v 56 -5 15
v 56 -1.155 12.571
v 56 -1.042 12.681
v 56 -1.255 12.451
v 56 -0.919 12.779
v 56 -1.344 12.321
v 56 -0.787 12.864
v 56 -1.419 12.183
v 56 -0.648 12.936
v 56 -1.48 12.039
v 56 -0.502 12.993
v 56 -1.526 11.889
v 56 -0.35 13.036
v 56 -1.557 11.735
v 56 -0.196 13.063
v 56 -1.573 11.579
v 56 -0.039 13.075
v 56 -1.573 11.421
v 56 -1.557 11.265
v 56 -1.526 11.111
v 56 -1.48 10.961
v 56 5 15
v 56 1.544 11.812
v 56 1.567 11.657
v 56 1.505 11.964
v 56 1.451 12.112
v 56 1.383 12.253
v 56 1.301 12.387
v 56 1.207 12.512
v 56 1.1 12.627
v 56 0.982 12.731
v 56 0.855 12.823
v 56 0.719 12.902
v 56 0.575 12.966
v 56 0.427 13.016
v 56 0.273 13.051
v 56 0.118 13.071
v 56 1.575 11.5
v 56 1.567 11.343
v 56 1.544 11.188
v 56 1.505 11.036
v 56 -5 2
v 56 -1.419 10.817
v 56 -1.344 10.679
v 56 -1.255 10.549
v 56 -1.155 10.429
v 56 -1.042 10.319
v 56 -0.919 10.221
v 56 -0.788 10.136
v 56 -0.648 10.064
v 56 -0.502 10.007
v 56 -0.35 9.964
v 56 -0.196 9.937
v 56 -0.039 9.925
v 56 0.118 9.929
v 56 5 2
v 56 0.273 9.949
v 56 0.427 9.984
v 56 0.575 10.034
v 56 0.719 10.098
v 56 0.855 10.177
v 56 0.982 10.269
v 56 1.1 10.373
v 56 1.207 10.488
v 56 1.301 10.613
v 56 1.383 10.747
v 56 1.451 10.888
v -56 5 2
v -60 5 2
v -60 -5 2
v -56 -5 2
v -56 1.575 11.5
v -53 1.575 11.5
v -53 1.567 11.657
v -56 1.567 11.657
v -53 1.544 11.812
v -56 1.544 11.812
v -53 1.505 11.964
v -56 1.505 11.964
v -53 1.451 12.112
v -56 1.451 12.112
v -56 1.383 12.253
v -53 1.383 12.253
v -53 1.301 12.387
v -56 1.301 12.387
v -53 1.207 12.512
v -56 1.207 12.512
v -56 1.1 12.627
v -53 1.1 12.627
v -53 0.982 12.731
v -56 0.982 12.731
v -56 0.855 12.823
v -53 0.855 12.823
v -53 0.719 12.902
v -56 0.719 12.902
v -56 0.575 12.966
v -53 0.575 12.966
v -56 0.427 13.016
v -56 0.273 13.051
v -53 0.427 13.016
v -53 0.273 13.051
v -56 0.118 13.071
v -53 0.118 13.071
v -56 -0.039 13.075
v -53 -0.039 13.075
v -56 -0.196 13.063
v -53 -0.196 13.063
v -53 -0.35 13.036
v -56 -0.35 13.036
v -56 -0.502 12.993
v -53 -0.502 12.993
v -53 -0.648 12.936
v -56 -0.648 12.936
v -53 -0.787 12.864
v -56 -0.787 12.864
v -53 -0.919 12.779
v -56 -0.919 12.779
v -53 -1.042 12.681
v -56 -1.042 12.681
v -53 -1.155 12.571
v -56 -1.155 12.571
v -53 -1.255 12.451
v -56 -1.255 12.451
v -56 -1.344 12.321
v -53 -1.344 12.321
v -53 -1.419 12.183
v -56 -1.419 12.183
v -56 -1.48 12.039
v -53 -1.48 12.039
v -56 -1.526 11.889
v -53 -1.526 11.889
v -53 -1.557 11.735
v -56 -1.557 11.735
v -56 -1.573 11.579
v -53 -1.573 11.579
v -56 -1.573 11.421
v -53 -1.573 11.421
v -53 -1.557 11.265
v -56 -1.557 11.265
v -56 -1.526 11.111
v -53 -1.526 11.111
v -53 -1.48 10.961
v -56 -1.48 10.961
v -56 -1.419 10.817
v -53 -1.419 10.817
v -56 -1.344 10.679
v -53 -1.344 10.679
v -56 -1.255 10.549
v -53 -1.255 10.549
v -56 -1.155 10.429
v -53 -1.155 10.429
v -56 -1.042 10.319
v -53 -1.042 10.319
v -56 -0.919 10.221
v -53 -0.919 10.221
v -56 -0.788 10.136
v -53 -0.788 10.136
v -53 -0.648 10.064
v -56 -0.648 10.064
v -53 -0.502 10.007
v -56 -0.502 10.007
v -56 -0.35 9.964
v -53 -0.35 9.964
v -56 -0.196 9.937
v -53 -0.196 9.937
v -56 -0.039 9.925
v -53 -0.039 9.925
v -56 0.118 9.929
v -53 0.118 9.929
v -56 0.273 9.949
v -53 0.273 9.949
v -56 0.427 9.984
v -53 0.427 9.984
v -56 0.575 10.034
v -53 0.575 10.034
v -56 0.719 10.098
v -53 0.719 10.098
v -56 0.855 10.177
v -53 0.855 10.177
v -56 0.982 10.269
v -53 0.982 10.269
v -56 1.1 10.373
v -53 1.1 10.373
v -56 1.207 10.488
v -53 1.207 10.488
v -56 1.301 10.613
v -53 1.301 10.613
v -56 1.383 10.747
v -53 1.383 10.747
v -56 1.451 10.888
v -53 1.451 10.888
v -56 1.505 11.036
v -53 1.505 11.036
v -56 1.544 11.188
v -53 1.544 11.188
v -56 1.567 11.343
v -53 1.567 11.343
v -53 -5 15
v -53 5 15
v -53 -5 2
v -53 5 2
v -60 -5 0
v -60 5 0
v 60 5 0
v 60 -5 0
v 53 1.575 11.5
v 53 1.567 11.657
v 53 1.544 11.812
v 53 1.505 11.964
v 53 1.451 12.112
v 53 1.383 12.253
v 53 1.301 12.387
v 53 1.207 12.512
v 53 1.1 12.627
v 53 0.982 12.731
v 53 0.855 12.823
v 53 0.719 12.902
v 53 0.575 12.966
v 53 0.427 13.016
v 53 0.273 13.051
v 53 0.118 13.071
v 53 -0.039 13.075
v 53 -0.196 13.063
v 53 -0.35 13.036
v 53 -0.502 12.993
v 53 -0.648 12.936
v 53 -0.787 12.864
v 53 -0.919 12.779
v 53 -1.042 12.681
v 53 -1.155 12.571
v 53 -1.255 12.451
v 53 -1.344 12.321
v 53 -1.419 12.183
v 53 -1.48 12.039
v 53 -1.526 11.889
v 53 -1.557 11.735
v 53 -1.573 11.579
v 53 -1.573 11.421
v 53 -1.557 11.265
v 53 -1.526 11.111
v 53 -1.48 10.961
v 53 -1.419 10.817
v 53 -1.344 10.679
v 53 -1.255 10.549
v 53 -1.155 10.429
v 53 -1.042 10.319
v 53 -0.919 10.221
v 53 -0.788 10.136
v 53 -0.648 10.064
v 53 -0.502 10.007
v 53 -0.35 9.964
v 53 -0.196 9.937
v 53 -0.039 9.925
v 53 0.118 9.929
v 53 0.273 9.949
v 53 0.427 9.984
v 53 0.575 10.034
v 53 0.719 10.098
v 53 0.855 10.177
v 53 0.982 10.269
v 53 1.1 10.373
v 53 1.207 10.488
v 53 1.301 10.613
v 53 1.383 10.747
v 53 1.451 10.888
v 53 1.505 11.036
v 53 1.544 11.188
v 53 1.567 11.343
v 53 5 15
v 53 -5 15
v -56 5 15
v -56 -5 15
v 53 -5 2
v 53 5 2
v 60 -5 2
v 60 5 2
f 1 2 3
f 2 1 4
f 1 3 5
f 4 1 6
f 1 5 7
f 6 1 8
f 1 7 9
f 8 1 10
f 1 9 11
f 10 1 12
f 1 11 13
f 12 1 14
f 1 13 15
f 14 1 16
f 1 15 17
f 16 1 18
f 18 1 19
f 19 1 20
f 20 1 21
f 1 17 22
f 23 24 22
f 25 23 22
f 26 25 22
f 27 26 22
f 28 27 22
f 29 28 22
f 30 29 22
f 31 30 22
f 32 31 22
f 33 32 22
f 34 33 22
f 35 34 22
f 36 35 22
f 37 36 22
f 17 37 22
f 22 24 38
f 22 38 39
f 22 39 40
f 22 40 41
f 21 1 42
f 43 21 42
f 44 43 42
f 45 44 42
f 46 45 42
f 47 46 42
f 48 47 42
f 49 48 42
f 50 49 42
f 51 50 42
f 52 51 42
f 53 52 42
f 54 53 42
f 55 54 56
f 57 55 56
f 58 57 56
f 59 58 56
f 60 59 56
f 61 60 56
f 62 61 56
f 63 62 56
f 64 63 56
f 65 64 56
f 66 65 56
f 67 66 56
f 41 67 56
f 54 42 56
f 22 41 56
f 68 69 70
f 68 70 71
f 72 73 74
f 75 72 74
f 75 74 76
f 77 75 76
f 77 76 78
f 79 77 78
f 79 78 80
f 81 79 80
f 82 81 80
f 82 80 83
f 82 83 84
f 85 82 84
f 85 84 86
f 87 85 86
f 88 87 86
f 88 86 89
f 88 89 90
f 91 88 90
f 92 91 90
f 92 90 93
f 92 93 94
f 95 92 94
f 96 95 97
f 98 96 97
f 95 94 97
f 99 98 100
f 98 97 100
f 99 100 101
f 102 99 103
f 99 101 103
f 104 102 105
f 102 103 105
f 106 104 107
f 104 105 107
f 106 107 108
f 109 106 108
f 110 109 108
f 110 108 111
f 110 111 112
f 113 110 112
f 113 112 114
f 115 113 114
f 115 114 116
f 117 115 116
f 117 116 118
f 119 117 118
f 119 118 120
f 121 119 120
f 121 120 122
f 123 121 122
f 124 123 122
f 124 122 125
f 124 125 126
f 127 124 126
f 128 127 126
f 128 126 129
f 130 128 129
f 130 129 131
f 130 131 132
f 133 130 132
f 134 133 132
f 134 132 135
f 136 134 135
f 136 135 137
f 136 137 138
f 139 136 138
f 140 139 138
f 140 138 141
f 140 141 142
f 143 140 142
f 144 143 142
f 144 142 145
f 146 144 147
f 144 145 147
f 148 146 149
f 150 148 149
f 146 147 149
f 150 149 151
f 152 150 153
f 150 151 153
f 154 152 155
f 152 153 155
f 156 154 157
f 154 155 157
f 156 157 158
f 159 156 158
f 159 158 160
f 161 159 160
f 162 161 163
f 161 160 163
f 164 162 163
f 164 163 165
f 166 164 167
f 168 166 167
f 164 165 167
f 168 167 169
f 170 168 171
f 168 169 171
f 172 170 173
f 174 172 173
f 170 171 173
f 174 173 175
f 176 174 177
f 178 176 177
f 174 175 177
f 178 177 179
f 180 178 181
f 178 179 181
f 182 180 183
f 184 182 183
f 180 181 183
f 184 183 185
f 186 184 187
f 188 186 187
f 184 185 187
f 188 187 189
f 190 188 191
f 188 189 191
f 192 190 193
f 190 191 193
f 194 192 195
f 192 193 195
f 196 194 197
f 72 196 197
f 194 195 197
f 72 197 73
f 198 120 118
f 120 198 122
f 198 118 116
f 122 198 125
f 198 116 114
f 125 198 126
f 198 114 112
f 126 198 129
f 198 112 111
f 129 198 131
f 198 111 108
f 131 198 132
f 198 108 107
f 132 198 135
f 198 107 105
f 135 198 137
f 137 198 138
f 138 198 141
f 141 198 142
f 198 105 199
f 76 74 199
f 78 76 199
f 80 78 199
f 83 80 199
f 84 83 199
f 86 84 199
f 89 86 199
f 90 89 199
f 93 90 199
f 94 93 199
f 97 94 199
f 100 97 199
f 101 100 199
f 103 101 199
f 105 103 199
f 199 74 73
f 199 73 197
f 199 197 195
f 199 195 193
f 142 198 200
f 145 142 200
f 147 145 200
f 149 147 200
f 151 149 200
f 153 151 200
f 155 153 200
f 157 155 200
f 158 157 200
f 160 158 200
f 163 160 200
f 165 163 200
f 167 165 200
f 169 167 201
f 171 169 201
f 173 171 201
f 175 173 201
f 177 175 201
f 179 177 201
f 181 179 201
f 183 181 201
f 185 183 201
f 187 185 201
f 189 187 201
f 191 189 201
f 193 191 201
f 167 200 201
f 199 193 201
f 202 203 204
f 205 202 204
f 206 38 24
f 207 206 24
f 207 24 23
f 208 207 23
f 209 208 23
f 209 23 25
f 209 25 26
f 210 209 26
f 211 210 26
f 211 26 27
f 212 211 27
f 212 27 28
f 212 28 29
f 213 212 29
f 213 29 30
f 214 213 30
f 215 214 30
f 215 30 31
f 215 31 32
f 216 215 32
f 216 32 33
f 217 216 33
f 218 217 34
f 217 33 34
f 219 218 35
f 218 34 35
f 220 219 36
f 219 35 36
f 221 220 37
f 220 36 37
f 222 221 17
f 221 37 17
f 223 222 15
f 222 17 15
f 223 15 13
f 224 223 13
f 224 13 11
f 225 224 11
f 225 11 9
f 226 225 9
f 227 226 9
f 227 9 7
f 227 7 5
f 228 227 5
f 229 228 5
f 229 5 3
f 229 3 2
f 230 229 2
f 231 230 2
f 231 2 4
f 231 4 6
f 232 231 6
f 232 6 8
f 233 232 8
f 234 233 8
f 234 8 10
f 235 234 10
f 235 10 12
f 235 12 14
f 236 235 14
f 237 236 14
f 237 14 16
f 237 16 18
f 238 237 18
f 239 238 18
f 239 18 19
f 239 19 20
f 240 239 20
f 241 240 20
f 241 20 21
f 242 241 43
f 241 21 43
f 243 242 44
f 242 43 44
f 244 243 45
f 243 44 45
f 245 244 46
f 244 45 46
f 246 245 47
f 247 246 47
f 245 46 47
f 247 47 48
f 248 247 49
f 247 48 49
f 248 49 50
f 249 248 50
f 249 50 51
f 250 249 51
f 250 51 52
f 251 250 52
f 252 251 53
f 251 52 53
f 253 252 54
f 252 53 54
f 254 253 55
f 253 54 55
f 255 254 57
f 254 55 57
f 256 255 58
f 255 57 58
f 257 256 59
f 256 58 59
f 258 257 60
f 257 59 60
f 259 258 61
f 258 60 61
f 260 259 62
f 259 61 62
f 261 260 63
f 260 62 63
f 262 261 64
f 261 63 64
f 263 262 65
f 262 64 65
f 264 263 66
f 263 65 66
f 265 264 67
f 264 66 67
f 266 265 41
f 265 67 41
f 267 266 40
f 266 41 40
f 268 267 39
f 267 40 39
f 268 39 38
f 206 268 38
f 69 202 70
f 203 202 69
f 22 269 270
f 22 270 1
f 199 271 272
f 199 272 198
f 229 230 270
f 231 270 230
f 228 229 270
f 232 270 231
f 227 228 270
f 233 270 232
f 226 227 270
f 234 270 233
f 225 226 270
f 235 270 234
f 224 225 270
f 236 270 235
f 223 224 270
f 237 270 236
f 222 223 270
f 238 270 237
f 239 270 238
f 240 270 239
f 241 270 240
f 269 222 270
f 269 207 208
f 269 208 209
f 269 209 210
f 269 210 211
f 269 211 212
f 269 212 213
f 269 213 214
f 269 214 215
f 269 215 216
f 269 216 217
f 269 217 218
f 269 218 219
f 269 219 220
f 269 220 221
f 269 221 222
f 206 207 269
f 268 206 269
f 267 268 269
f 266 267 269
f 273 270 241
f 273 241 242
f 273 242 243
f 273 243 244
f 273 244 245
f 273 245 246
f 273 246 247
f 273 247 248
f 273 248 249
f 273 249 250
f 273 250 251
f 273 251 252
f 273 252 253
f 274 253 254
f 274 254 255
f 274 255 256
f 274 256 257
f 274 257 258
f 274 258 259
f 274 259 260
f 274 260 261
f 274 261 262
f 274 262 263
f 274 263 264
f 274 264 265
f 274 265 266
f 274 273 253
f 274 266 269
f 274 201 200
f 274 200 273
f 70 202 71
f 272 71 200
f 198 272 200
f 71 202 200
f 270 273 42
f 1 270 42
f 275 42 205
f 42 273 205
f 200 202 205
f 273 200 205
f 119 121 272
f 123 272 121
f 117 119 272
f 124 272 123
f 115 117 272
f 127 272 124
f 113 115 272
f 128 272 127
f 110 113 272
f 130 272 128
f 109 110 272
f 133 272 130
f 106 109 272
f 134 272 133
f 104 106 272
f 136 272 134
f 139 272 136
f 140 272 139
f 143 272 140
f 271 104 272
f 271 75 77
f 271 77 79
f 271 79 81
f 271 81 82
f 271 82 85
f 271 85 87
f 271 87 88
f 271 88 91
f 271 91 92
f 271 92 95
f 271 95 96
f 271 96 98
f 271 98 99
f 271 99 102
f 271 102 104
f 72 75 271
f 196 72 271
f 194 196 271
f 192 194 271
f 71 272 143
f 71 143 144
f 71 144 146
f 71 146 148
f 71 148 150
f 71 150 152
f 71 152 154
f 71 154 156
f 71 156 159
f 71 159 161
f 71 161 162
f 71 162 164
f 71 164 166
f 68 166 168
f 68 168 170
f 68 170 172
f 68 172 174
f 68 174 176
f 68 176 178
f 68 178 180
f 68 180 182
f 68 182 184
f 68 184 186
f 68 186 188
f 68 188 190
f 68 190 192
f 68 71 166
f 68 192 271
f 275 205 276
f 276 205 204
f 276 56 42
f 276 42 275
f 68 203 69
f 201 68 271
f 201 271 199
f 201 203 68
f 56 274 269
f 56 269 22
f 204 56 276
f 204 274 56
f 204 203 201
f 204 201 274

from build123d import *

# Parameters (mm, degrees)
SKETCH_1_W          = 120
SKETCH_1_H          = 10
EXTRUDE_1_DEPTH     = 2
SKETCH_2_W          = 3
SKETCH_2_H          = 10
EXTRUDE_2_DEPTH     = 13
CUT_EXTRUDE_1_REACH = 119.073
SKETCH_3_R          = 1.575


with BuildPart() as part:
    # 草图1 → 凸台-拉伸1 (new body)
    with BuildSketch(Plane.XY):
        Rectangle(SKETCH_1_W, SKETCH_1_H)
    extrude(amount=EXTRUDE_1_DEPTH)

    # 草图2 → 凸台-拉伸2 (add)
    with BuildSketch(Plane.XY.offset(2)):
        with Locations((-54.5, 0)):
            Rectangle(SKETCH_2_W, SKETCH_2_H)
        with Locations((54.5, 0)):
            Rectangle(SKETCH_2_W, SKETCH_2_H)
    extrude(amount=EXTRUDE_2_DEPTH)

    # 切除-拉伸1: up to this face of the body (flat: up to its plane)
    cut_extrude_1_end = Plane(part.part.faces().sort_by_distance((-56, 0, 8.5))[0])
    # 草图3 → 切除-拉伸1 (cut, up to the picked face)
    with BuildSketch(Plane(origin=(56, 0, 0), x_dir=(0, 0, -1), z_dir=(1, 0, 0)), mode=Mode.PRIVATE) as cut_extrude_1_sk1:
        with Locations(Location((-11.5, 0, 0), (0, 0, 90))):
            Circle(SKETCH_3_R)
    cut_extrude_1_tool1 = split(extrude(cut_extrude_1_sk1.sketch, amount=-CUT_EXTRUDE_1_REACH, mode=Mode.PRIVATE), bisect_by=cut_extrude_1_end, keep=Keep.BOTH, mode=Mode.PRIVATE)
    add(cut_extrude_1_tool1.solids().sort_by(Axis((56, 0, 11.5), (-1, 0, 0)))[0], mode=Mode.SUBTRACT)


solid = part.part
